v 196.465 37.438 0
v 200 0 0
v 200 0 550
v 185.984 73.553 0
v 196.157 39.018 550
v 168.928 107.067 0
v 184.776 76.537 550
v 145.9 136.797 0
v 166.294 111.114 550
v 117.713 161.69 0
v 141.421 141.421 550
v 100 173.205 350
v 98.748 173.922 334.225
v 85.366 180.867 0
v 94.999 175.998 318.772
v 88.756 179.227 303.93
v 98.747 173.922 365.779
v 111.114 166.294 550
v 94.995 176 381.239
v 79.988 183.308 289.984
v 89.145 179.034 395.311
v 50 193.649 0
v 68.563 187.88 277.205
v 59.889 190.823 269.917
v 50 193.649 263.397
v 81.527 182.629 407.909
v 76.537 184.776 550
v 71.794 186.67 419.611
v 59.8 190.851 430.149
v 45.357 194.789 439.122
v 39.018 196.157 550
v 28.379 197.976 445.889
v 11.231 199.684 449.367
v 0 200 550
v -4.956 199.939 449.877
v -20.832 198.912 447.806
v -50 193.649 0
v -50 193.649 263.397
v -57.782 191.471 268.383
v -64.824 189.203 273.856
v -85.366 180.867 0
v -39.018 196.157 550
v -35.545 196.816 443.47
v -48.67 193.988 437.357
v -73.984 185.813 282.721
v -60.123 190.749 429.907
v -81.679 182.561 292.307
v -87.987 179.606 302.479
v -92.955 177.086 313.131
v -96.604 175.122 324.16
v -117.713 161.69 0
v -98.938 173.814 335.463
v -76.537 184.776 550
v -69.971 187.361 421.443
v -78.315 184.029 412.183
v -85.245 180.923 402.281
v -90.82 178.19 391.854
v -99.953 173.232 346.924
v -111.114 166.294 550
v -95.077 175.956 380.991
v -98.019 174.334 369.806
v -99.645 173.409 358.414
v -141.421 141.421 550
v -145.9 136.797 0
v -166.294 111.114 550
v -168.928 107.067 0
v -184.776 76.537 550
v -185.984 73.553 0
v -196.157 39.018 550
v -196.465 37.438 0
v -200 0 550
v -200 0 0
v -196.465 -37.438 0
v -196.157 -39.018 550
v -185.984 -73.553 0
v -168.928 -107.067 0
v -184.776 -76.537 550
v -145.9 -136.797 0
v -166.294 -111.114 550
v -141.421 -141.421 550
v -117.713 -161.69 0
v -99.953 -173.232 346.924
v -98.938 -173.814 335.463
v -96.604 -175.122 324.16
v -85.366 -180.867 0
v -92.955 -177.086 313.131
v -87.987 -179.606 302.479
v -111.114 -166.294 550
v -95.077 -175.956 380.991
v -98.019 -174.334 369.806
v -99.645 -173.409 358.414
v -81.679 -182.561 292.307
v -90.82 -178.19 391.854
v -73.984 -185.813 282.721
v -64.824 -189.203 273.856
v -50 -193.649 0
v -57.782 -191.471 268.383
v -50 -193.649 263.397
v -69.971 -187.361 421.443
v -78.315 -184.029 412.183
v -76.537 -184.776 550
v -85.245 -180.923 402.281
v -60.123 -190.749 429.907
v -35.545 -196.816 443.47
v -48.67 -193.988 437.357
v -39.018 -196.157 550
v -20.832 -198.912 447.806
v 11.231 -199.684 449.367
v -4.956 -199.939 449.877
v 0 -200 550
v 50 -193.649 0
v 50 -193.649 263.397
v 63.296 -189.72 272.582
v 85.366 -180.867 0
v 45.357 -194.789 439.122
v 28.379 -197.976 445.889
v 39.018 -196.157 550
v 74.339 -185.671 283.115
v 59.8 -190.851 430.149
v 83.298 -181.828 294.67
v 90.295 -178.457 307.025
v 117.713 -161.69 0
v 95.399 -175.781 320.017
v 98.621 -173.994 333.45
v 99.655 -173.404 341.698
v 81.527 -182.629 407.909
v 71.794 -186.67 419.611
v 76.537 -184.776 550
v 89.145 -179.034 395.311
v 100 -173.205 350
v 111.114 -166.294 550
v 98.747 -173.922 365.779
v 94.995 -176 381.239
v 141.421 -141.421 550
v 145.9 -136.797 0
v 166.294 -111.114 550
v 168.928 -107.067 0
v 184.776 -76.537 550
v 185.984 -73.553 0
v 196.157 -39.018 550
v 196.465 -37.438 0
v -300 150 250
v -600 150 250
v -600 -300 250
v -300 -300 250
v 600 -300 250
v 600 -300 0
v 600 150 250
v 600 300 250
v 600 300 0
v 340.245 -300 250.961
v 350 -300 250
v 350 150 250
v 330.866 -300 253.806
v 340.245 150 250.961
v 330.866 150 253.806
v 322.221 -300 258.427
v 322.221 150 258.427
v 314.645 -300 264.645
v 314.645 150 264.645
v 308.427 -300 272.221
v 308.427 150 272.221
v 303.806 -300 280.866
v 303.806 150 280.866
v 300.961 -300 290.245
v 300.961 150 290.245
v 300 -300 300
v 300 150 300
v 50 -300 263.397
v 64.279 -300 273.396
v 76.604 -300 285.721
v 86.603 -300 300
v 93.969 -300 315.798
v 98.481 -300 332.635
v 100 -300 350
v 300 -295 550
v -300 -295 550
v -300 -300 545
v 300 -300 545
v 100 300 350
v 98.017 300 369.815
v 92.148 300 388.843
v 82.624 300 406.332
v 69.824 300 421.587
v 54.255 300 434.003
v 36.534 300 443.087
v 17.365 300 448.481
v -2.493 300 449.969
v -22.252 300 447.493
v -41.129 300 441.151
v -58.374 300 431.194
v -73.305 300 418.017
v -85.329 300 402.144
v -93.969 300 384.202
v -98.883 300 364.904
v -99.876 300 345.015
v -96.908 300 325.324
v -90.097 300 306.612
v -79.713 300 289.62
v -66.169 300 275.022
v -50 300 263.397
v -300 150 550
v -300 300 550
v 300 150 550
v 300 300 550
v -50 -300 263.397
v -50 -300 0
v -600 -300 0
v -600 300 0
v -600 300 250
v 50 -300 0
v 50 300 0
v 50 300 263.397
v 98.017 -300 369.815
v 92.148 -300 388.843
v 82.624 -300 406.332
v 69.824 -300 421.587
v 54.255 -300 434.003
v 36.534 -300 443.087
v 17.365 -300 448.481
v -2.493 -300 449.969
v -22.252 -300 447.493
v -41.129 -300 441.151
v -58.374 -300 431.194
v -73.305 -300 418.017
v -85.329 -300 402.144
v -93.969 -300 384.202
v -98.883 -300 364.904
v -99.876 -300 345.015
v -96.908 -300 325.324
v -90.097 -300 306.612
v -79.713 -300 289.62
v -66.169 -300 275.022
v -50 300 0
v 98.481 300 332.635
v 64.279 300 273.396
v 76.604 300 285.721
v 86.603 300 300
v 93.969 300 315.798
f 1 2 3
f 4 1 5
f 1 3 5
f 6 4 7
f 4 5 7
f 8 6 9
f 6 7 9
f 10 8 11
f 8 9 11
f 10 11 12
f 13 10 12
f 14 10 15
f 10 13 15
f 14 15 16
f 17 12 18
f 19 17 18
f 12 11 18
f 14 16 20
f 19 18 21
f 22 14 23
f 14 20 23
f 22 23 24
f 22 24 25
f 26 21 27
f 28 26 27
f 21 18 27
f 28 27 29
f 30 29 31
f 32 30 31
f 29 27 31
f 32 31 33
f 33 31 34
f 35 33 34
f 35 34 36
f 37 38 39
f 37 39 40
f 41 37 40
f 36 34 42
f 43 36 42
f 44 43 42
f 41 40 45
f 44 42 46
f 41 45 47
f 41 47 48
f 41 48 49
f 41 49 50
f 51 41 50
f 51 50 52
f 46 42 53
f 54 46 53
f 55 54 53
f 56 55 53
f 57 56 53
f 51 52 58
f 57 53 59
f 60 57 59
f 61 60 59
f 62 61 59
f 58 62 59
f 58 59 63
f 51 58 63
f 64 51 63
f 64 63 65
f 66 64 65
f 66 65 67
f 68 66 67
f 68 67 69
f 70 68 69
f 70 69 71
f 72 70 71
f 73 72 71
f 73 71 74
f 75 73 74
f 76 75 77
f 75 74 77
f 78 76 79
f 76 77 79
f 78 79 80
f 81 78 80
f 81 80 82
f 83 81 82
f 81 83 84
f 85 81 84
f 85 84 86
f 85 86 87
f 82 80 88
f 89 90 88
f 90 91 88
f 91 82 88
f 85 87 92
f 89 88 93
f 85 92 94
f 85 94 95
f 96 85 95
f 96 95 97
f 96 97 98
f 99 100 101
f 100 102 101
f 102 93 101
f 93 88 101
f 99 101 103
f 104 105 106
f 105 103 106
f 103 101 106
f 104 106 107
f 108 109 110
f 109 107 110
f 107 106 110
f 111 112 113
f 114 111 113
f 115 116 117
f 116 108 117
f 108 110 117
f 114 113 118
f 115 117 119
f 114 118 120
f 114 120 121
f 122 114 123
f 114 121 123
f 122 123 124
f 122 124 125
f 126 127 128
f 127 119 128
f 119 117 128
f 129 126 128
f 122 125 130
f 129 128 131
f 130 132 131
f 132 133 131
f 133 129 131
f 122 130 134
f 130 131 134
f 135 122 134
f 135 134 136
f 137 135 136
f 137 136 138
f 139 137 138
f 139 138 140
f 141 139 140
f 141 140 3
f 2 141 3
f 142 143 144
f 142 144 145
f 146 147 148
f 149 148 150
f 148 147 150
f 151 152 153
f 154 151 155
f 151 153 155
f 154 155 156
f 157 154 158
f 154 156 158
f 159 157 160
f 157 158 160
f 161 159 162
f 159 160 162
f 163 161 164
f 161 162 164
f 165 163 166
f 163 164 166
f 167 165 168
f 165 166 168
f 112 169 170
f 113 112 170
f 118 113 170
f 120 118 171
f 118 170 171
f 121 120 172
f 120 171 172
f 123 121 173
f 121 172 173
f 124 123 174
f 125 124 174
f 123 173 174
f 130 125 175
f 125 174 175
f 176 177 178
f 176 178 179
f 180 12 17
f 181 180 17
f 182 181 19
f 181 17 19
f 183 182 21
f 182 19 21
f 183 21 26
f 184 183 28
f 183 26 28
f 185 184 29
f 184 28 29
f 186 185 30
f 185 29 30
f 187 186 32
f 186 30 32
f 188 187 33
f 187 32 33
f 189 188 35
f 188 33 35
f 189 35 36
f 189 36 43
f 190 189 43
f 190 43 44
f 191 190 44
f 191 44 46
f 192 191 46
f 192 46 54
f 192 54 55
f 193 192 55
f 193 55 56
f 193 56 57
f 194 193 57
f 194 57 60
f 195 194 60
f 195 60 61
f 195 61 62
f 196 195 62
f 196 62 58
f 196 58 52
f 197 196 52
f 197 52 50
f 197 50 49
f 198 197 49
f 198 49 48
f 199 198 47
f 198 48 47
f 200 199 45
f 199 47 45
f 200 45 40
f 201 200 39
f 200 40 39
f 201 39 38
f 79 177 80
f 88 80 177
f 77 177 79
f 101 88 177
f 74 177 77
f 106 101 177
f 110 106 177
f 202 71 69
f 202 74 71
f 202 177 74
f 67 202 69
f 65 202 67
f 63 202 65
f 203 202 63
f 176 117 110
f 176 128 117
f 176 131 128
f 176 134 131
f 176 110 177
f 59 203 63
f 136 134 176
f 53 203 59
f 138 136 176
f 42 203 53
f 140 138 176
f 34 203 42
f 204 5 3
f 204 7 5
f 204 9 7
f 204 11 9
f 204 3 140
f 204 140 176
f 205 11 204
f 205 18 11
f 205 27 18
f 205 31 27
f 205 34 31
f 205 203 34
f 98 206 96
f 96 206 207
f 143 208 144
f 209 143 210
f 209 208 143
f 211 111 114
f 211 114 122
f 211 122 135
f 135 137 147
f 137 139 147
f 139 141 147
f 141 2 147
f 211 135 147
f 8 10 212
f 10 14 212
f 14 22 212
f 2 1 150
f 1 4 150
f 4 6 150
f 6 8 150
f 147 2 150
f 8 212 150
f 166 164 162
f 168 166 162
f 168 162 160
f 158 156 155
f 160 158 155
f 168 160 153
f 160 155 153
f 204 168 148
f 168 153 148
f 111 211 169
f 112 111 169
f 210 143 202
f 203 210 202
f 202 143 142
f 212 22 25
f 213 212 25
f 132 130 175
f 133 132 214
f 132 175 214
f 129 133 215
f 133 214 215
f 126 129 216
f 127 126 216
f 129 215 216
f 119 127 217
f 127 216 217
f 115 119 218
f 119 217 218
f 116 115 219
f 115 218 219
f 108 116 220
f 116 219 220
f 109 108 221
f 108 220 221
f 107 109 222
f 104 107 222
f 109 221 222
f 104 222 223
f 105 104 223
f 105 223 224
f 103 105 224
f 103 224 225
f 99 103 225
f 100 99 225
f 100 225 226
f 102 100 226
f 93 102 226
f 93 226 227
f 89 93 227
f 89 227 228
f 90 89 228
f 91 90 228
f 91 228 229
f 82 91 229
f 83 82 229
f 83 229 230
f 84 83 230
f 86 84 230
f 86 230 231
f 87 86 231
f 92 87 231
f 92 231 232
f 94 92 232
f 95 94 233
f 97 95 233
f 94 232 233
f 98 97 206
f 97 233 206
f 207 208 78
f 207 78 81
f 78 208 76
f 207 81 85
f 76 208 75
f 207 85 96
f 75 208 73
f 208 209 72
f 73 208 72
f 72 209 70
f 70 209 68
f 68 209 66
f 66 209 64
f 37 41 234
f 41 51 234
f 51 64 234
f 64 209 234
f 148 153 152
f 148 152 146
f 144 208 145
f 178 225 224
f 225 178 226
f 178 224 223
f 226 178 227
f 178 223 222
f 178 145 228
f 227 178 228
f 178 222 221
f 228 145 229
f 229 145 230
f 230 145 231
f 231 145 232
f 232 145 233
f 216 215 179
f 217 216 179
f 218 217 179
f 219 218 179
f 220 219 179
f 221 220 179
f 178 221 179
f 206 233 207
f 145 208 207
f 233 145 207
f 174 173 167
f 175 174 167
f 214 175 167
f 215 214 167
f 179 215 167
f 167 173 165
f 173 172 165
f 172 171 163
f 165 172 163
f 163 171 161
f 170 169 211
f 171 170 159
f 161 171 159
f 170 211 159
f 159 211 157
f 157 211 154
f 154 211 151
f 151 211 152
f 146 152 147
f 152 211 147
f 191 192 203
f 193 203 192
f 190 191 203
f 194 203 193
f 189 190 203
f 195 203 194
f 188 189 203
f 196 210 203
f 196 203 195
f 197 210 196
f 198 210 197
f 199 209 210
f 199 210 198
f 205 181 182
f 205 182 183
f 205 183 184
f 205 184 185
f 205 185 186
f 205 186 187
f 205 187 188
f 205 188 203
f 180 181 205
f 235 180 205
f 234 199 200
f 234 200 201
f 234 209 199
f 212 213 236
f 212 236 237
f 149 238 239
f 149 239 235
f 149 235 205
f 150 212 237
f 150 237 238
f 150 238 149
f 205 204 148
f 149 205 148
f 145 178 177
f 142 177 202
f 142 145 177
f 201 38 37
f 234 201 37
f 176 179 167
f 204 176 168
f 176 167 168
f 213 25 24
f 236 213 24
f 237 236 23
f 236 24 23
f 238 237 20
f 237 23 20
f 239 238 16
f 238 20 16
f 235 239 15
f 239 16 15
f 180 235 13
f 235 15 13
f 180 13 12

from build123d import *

# Parameters (mm, degrees)
F0_W      = 1200
F0_H      = 600
F1_DEPTH  = 250
F2_W      = 600
F2_H      = 600
F3_DEPTH  = 300
F4_R      = 200
F5_DEPTH  = 550.001
F6_W      = 300
F6_H      = 150
F7_DEPTH  = 300
F8_W      = 300
F8_H      = 150
F9_DEPTH  = 300
F11_DEPTH = 600.001
F13_DEPTH = 150.0010001
F15_DEPTH = 150.0010001
F16_R     = 50
F17_SIZE2 = 5
F17_SIZE  = 5


with BuildPart() as f1:
    # F0 (on Top) → F1 (new body)
    with BuildSketch(Plane.XY):
        Rectangle(F0_W, F0_H)
    extrude(amount=F1_DEPTH)

    # F2 (on face) → F3 (join)
    with BuildSketch(Plane.XY.offset(250)):
        Rectangle(F2_W, F2_H)
    extrude(amount=F3_DEPTH)

    # F4 (on face) → F5 (cut, through all)
    with BuildSketch(Plane.XY.offset(550)):
        Circle(F4_R)
    extrude(amount=-F5_DEPTH, mode=Mode.SUBTRACT)

    # F6 (on face) → F7 (join)
    with BuildSketch(Plane.XY.offset(250)):
        with Locations((450, 225)):
            Rectangle(F6_W, F6_H)
    extrude(amount=F7_DEPTH)

    # F8 (on face) → F9 (join)
    with BuildSketch(Plane.XY.offset(250)):
        with Locations((-450, 225)):
            Rectangle(F8_W, F8_H)
    extrude(amount=F9_DEPTH)

    # F10 (on face) → F11 (cut, through all)
    with BuildSketch(Plane.XZ.offset(300)):
        with BuildLine():
            ThreePointArc((50, 263.3974596216), (86.6025403784, 300), (100, 350))
            ThreePointArc((100, 350), (-50, 436.6025403784), (-50, 263.3974596216))
            ThreePointArc((-50, 263.3974596216), (0, 250), (50, 263.3974596216))
        make_face()
        with BuildLine():
            ThreePointArc((50, 263.3974596216), (0, 250), (-50, 263.3974596216))
            Line((-50, 263.3974596216), (-50, 0))
            Line((-50, 0), (50, 0))
            Line((50, 0), (50, 263.3974596216))
        make_face()
    extrude(amount=-F11_DEPTH, mode=Mode.SUBTRACT)

    # F12 (on face) → F13 (cut, through all)
    with BuildSketch(Plane.XZ.offset(-150)):
        Polygon((600, 550), (300, 550), (600, 250), align=None)
    extrude(amount=-F13_DEPTH, mode=Mode.SUBTRACT)

    # F14 (on face) → F15 (cut, through all)
    with BuildSketch(Plane.XZ.offset(-150)):
        Polygon((-600, 250), (-300, 550), (-600, 550), align=None)
    extrude(amount=-F15_DEPTH, mode=Mode.SUBTRACT)

    # F16
    f16_edges = [f1.edges().sort_by_distance(p)[0] for p in [
        (300, -75, 250),
    ]]
    fillet(f16_edges, radius=F16_R)

    # F17
    f17_edges = [f1.edges().sort_by_distance(p)[0] for p in [
        (0, -300, 550),
    ]]
    chamfer(f17_edges, length=F17_SIZE, length2=F17_SIZE2)


solid = f1.part
